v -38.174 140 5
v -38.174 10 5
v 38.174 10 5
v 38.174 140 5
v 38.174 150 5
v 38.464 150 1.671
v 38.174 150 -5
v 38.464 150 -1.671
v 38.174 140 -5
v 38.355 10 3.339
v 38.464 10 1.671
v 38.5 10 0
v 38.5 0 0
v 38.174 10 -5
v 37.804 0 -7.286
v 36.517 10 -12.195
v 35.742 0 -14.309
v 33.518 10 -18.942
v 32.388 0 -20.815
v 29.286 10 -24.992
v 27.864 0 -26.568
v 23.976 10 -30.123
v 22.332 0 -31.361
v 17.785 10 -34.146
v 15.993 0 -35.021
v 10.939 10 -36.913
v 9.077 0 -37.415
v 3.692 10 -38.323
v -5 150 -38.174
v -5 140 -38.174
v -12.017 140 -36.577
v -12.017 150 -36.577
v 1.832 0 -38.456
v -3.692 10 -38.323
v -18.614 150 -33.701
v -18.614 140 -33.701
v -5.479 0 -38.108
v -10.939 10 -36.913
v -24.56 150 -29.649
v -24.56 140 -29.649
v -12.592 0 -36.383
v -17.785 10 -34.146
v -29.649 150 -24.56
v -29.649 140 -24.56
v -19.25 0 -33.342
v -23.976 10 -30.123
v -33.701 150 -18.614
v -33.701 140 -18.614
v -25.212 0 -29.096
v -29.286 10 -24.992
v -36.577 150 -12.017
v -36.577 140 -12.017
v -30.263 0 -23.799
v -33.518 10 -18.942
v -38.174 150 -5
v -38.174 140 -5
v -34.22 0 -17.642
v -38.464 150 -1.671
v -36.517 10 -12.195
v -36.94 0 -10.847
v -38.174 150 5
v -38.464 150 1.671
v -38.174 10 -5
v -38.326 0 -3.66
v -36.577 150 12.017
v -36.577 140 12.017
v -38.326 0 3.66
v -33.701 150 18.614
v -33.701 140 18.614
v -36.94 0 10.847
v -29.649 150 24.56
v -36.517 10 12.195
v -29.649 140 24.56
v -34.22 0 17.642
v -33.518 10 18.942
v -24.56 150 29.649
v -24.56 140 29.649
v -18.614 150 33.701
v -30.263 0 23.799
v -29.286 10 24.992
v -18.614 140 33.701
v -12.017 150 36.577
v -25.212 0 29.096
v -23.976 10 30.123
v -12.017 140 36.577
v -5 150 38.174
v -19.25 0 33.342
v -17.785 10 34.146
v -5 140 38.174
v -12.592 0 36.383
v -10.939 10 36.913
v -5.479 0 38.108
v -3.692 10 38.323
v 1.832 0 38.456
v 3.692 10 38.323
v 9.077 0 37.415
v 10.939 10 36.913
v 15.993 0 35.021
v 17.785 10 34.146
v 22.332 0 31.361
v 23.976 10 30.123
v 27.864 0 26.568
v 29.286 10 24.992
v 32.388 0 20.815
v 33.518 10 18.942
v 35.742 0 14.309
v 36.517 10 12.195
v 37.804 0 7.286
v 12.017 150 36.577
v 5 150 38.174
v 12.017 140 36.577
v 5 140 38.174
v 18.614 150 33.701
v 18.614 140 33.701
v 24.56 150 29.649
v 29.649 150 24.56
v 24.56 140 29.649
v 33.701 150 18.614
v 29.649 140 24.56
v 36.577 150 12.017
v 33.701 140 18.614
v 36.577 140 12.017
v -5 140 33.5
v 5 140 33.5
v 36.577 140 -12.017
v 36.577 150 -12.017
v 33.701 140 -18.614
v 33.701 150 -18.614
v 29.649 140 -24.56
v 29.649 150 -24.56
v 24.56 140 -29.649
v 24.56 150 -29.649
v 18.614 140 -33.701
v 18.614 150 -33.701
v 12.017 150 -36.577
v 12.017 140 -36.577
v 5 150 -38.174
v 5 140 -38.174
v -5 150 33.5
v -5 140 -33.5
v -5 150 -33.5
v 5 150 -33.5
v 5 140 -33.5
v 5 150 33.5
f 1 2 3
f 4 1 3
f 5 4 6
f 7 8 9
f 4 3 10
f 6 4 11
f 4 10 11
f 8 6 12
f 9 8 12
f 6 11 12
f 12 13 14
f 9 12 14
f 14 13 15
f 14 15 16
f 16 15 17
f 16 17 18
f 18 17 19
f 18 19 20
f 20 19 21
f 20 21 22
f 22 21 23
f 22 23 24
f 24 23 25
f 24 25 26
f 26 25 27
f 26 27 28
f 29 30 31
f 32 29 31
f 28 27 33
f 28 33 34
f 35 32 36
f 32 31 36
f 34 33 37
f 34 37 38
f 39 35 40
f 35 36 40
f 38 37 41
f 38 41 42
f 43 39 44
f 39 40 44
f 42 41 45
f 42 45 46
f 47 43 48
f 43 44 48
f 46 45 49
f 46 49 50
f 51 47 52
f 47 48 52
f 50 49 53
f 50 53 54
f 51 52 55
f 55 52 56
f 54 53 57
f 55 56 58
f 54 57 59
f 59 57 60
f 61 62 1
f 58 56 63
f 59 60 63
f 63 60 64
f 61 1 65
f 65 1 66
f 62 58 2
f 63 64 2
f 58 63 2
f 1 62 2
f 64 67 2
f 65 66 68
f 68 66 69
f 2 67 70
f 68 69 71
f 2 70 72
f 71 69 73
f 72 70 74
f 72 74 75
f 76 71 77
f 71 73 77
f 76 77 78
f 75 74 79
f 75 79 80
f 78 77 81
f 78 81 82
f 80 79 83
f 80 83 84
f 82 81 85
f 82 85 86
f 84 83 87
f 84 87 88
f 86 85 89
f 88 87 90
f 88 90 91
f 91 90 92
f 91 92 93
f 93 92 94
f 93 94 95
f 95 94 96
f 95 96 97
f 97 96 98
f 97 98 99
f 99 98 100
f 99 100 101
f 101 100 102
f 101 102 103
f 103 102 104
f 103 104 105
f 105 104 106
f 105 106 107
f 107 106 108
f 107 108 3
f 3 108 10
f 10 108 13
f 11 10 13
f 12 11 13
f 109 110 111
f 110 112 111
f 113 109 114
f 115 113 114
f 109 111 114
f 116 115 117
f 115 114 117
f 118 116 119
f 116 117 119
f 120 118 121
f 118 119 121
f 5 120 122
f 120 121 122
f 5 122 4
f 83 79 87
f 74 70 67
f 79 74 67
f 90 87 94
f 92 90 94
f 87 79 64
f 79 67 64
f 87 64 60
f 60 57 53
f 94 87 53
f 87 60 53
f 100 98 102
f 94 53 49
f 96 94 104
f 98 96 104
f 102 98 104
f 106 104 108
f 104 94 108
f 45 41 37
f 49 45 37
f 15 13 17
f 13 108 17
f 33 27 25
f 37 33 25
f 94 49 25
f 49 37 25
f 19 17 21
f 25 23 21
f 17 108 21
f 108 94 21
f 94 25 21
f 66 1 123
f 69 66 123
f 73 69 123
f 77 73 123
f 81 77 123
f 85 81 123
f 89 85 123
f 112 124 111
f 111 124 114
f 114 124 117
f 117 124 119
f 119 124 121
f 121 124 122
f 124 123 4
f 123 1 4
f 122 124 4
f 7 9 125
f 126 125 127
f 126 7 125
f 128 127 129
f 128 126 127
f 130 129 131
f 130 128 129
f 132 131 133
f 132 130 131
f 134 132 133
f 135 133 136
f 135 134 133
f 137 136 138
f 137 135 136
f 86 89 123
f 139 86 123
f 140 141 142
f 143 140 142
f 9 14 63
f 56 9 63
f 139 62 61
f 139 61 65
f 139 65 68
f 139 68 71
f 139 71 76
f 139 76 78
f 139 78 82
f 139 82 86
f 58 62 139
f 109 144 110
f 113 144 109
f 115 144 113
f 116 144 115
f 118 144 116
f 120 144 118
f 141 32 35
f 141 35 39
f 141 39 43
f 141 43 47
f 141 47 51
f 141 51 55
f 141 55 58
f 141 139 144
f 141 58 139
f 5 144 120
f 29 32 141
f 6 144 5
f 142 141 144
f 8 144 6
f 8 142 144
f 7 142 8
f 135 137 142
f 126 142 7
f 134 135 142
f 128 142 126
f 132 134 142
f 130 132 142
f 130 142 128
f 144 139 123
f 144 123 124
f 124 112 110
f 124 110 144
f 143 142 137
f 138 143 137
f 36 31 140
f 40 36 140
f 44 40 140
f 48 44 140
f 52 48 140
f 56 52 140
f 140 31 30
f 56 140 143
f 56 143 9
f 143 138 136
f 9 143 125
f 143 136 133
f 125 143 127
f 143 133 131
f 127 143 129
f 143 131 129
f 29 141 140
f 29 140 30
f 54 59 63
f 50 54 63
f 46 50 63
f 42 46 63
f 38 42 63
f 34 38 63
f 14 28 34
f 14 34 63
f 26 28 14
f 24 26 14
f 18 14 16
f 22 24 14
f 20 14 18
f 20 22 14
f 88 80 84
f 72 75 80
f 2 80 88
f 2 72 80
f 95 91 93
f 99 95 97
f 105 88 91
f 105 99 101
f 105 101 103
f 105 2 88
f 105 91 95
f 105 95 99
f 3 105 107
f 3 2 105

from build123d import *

# Parameters (mm, degrees)
SKETCH1_R           = 38.5
BOSS_EXTRUDE1_DEPTH = 10
SKETCH2_R           = 38.5
BOSS_EXTRUDE2_DEPTH = 10
BOSS_EXTRUDE3_DEPTH = 140
CUT_EXTRUDE1_REACH  = 152
SKETCH4_W           = 10
SKETCH4_H           = 10


with BuildPart() as part:
    # Sketch1 → Boss-Extrude1 (new body)
    with BuildSketch(Plane(origin=(0, 0, 0), x_dir=(1, 0, 0), z_dir=(0, 1, 0))):
        Circle(SKETCH1_R)
    extrude(amount=BOSS_EXTRUDE1_DEPTH)



with BuildPart() as body_2:
    # Sketch2 → Boss-Extrude2 (new body)
    with BuildSketch(Plane(origin=(0, 150, 0), x_dir=(1, 0, 0), z_dir=(0, 1, 0))):
        Circle(SKETCH2_R)
    extrude(amount=-BOSS_EXTRUDE2_DEPTH)


with BuildPart() as part_1:
    add(part.part)

    add(body_2.part)  # Boss-Extrude3 merges body 2
    # Sketch3 → Boss-Extrude3 (add)
    with BuildSketch(Plane(origin=(0, 10, 0), x_dir=(1, 0, 0), z_dir=(0, 1, 0))):
        with BuildLine():
            Line((38.173943993, 5), (-38.173943993, 5))
            ThreePointArc((-38.173943993, 5), (-38.5, 0), (-38.173943993, -5))
            Line((-38.173943993, -5), (38.173943993, -5))
            ThreePointArc((38.173943993, -5), (38.5, 0), (38.173943993, 5))
        make_face()
    extrude(amount=BOSS_EXTRUDE3_DEPTH)

    # Sketch4 → Cut-Extrude1 (cut, up to next)
    with BuildSketch(Plane(origin=(0, 150, 0), x_dir=(1, 0, 0), z_dir=(0, 1, 0)), mode=Mode.PRIVATE) as cut_extrude1_sk1:
        with Locations((0, 38.5)):
            Rectangle(SKETCH4_W, SKETCH4_H)
    cut_extrude1_tool1 = extrude(cut_extrude1_sk1.sketch, amount=-CUT_EXTRUDE1_REACH, mode=Mode.PRIVATE) & part_1.part
    add(cut_extrude1_tool1.solids().sort_by_distance((0, 150, -38.5))[0], mode=Mode.SUBTRACT)
    # Sketch4 → Cut-Extrude1 (cut, up to next)
    with BuildSketch(Plane(origin=(0, 150, 0), x_dir=(1, 0, 0), z_dir=(0, 1, 0)), mode=Mode.PRIVATE) as cut_extrude1_sk2:
        with Locations((0, -38.5)):
            Rectangle(SKETCH4_W, SKETCH4_H)
    cut_extrude1_tool2 = extrude(cut_extrude1_sk2.sketch, amount=-CUT_EXTRUDE1_REACH, mode=Mode.PRIVATE) & part_1.part
    add(cut_extrude1_tool2.solids().sort_by_distance((0, 150, 38.5))[0], mode=Mode.SUBTRACT)


solid = part_1.part
